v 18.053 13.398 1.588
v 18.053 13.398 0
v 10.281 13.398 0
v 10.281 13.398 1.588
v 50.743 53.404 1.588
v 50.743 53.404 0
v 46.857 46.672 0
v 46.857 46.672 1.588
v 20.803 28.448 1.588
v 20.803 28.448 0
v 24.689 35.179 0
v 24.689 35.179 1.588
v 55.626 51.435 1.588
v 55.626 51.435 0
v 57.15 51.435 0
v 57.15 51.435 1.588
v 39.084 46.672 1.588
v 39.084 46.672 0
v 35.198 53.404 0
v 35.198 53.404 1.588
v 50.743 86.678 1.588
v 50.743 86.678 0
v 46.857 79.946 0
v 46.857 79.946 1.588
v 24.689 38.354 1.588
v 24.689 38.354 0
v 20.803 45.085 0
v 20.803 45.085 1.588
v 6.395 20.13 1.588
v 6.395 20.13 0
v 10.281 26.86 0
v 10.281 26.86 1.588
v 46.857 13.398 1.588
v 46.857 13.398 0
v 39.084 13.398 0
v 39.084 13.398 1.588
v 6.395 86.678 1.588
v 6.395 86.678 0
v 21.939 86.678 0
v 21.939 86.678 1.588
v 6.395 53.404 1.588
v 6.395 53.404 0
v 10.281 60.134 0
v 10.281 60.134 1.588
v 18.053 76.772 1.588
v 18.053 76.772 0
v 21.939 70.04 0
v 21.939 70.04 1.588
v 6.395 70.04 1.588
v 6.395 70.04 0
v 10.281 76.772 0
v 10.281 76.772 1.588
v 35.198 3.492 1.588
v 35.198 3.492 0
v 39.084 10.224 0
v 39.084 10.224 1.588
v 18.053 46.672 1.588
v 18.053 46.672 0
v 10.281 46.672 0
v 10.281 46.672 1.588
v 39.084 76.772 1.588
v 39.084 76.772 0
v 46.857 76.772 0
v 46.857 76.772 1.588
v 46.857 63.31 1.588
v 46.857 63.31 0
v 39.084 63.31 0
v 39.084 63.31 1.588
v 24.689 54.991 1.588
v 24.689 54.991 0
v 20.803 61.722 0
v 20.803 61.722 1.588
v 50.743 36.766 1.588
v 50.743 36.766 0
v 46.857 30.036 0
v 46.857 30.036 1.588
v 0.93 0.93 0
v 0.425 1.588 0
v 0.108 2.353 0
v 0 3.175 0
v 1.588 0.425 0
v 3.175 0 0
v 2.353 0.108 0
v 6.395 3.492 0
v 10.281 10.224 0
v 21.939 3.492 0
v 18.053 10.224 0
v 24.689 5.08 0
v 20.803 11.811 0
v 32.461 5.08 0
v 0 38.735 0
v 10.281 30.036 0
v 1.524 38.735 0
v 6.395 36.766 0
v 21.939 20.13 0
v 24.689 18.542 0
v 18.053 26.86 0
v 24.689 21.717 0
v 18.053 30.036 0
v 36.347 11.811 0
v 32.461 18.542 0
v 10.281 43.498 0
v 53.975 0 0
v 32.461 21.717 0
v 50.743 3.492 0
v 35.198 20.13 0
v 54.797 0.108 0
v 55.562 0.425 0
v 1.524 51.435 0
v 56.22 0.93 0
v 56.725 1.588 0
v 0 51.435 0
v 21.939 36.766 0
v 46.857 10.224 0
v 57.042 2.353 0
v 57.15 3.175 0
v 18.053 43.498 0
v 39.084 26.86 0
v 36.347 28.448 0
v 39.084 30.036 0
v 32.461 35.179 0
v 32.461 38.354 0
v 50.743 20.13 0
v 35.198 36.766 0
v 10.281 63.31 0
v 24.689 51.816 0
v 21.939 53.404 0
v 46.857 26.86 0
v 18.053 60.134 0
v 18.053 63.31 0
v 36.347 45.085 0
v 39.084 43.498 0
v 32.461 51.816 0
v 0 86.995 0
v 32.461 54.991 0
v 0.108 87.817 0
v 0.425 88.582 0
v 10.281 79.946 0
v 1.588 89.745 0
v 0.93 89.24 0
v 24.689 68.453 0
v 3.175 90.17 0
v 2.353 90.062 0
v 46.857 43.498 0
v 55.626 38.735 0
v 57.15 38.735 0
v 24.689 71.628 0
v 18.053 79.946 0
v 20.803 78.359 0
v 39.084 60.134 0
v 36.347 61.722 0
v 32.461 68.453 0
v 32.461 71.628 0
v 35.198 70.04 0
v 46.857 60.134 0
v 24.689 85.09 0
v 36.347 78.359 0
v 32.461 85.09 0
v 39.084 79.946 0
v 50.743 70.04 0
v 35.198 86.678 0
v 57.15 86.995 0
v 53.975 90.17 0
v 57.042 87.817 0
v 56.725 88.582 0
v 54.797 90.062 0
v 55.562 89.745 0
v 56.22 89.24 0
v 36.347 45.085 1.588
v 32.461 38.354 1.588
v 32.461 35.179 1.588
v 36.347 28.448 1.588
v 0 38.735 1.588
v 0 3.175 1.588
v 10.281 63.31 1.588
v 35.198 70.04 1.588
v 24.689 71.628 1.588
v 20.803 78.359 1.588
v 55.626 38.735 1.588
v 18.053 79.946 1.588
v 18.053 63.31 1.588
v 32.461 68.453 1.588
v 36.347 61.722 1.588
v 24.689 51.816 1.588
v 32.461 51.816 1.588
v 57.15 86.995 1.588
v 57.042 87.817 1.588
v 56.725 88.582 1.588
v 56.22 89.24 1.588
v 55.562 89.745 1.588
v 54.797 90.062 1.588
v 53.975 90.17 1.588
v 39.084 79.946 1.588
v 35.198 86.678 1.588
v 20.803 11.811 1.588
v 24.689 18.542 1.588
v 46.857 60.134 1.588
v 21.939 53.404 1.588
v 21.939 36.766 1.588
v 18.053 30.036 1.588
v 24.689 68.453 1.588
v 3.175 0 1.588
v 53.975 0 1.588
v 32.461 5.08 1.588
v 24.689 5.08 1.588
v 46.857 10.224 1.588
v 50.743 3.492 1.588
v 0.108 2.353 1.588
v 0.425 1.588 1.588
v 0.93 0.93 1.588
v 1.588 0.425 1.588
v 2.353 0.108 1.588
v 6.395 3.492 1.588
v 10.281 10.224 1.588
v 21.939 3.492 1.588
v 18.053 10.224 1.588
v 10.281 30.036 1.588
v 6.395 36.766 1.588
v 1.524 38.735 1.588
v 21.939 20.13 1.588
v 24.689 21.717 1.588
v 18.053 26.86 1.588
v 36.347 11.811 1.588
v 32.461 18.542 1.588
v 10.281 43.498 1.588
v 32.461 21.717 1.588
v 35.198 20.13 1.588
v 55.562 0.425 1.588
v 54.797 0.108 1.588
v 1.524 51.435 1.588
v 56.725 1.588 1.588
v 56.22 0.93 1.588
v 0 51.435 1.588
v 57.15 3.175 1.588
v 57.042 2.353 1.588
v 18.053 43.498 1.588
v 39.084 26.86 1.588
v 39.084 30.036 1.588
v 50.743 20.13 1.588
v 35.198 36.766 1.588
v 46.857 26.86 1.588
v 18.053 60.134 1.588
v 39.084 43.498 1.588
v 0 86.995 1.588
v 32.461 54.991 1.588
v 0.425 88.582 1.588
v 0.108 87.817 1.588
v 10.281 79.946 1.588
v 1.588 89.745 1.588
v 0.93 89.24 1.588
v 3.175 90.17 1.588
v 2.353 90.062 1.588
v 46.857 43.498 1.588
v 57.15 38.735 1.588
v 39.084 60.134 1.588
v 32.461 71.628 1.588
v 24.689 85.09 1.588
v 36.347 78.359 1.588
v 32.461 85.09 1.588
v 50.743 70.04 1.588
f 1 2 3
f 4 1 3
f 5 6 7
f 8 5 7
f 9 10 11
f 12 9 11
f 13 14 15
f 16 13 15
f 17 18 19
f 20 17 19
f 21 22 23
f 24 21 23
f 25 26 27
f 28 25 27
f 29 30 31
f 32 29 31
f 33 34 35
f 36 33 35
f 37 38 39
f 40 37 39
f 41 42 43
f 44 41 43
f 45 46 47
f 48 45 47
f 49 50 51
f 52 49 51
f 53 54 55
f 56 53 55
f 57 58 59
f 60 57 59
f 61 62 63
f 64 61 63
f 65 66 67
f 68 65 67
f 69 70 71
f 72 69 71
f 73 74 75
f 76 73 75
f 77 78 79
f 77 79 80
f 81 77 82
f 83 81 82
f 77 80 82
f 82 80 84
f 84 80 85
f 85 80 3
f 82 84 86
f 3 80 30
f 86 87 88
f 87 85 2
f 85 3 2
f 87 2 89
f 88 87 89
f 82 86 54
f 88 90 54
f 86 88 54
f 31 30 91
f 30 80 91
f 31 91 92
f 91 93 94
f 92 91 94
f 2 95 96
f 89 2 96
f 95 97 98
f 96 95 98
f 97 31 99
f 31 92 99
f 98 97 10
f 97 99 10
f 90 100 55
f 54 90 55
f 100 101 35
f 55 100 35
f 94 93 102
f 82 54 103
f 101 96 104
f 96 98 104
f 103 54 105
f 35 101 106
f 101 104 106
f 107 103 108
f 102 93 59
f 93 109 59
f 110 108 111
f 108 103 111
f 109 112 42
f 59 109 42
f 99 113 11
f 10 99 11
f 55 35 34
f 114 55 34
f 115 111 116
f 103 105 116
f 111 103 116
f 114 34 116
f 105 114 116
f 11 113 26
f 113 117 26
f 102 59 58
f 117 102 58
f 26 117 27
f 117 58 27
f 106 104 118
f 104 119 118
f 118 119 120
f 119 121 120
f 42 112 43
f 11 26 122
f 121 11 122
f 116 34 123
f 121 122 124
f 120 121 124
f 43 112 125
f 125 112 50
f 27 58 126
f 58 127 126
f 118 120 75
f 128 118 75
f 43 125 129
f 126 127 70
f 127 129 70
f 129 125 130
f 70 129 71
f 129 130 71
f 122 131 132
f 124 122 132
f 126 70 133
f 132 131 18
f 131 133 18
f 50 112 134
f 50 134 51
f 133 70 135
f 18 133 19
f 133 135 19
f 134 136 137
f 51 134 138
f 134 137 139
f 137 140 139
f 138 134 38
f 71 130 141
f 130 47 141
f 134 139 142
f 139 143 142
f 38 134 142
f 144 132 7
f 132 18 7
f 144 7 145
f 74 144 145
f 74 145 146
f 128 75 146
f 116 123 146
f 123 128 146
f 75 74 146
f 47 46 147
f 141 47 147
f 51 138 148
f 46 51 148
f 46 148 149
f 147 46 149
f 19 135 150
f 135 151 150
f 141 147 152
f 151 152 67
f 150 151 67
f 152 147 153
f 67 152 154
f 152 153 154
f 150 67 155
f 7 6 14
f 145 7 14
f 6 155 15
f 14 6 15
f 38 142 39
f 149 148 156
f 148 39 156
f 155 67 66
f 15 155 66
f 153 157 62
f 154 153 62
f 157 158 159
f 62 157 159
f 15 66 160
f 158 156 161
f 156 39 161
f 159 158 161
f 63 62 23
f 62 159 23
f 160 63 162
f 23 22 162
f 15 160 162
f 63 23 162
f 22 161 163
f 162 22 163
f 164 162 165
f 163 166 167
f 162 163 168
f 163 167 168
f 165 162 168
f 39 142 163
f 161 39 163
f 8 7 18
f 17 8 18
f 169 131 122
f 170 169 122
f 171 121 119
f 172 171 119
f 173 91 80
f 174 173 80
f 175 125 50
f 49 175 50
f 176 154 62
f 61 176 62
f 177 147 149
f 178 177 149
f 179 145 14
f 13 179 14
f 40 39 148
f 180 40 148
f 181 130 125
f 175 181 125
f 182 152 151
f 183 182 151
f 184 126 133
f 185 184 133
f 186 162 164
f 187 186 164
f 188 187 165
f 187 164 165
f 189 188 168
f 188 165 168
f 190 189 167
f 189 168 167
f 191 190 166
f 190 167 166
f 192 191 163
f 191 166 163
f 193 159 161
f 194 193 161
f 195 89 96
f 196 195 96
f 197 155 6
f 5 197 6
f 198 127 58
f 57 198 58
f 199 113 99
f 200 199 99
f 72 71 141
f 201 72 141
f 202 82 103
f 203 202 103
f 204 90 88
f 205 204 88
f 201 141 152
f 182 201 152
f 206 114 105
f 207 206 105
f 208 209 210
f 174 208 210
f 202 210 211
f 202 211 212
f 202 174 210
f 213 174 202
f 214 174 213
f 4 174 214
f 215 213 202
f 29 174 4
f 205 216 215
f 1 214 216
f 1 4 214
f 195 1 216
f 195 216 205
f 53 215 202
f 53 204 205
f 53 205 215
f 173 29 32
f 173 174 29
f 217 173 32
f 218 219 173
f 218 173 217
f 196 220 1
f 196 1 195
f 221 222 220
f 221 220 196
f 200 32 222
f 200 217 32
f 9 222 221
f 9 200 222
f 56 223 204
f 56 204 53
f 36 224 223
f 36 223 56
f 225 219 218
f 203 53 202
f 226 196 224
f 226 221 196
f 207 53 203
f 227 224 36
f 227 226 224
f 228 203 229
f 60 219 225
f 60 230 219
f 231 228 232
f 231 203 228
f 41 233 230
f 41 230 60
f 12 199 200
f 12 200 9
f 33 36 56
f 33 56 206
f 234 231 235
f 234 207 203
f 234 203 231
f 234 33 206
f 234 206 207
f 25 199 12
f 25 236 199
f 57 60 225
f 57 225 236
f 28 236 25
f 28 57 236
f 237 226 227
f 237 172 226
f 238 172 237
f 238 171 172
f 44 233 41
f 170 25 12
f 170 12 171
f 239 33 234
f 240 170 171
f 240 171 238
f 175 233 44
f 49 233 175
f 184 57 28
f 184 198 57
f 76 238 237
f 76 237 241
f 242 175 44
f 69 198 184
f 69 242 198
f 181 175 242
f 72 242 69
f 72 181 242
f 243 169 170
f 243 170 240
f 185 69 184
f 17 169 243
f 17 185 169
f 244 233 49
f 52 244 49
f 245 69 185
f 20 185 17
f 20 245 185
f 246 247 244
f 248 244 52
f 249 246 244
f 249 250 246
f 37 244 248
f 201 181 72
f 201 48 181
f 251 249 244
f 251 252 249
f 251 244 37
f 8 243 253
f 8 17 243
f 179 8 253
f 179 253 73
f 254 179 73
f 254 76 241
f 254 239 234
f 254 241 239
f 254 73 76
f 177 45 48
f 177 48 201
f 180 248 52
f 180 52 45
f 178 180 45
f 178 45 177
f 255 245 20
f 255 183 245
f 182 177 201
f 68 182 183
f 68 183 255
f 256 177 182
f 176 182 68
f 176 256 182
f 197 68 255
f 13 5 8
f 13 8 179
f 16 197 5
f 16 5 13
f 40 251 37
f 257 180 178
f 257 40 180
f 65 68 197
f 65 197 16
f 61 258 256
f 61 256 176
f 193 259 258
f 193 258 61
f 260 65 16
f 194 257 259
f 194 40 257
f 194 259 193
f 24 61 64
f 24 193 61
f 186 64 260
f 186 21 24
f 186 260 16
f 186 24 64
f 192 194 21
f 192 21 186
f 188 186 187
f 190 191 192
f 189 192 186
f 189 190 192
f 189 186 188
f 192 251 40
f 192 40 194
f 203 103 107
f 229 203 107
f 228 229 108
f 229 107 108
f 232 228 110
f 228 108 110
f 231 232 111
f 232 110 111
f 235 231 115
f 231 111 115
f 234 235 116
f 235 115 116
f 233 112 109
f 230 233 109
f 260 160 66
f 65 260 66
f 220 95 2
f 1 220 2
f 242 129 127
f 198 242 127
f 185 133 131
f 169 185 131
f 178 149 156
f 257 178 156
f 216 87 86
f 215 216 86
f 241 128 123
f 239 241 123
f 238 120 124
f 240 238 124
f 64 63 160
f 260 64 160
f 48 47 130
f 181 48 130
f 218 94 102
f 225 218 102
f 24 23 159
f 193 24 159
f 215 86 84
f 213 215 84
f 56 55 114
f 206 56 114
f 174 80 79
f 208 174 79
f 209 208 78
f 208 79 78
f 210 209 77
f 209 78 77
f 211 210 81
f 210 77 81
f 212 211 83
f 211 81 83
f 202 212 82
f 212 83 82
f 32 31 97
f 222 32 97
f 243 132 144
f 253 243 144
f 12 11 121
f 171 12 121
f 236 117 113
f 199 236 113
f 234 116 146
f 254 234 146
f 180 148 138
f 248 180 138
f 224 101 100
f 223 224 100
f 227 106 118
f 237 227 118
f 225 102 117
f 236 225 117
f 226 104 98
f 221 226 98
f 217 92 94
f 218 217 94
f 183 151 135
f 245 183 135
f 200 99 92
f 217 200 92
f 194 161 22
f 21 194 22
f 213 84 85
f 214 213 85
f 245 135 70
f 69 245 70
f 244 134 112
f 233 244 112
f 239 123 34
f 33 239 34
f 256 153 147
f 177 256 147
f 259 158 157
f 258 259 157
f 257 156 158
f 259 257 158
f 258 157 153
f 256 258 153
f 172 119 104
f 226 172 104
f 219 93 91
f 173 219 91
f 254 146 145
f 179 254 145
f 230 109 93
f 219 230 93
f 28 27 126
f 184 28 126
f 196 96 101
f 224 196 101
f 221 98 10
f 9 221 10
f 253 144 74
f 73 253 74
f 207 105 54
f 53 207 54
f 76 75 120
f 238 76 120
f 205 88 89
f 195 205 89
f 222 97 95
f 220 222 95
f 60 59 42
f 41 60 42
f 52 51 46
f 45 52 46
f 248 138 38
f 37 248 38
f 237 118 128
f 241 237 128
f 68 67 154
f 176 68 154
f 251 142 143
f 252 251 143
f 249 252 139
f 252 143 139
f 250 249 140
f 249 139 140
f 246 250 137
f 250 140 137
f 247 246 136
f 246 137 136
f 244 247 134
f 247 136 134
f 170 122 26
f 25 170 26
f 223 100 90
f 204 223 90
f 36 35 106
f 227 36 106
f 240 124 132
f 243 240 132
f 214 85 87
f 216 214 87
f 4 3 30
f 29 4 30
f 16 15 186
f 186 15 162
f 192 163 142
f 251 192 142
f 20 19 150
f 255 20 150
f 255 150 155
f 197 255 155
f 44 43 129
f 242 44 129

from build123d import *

# Parameters (mm, degrees)
F1_DEPTH = 1.5875


with BuildPart() as f1:
    # F0 (on Top) → F1 (new body)
    with BuildSketch(Plane.XY):
        with BuildLine():
            ThreePointArc((0, 3.175), (0.929936, 0.929936), (3.175, 0))
            Line((3.175, 0), (53.975, 0))
            ThreePointArc((53.975, 0), (56.220064, 0.929936), (57.15, 3.175))
            Line((57.15, 3.175), (57.15, 38.735))
            Line((57.15, 38.735), (55.626, 38.735))
            Line((55.626, 38.735), (55.626, 51.435))
            Line((55.626, 51.435), (57.15, 51.435))
            Line((57.15, 51.435), (57.15, 86.995))
            ThreePointArc((57.15, 86.995), (56.220064, 89.240064), (53.975, 90.17))
            Line((53.975, 90.17), (3.175, 90.17))
            ThreePointArc((3.175, 90.17), (0.929936, 89.240064), (0, 86.995))
            Line((0, 86.995), (0, 51.435))
            Line((0, 51.435), (1.524, 51.435))
            Line((1.524, 51.435), (1.524, 38.735))
            Line((1.524, 38.735), (0, 38.735))
            Line((0, 38.735), (0, 3.175))
        make_face()
        Polygon((10.280791, 10.2235), (18.05308, 10.2235), (21.939225, 3.4925), (6.394646, 3.4925), align=None, mode=Mode.SUBTRACT)
        Polygon((10.280791, 26.8605), (18.05308, 26.8605), (21.939225, 20.1295), (18.05308, 13.3985), (10.280791, 13.3985), (6.394646, 20.1295), align=None, mode=Mode.SUBTRACT)
        Polygon((10.280791, 43.4975), (18.05308, 43.4975), (21.939225, 36.7665), (18.05308, 30.0355), (10.280791, 30.0355), (6.394646, 36.7665), align=None, mode=Mode.SUBTRACT)
        Polygon((36.347289, 11.811), (32.461145, 5.08), (24.688855, 5.08), (20.802711, 11.811), (24.688855, 18.542), (32.461145, 18.542), align=None, mode=Mode.SUBTRACT)
        Polygon((39.084391, 10.2235), (46.85668, 10.2235), (50.742825, 3.4925), (35.198246, 3.4925), align=None, mode=Mode.SUBTRACT)
        Polygon((39.084391, 26.8605), (46.85668, 26.8605), (50.742825, 20.1295), (46.85668, 13.3985), (39.084391, 13.3985), (35.198246, 20.1295), align=None, mode=Mode.SUBTRACT)
        Polygon((36.347289, 28.448), (32.461145, 21.717), (24.688855, 21.717), (20.802711, 28.448), (24.688855, 35.179), (32.461145, 35.179), align=None, mode=Mode.SUBTRACT)
        Polygon((39.084391, 43.4975), (46.85668, 43.4975), (50.742825, 36.7665), (46.85668, 30.0355), (39.084391, 30.0355), (35.198246, 36.7665), align=None, mode=Mode.SUBTRACT)
        Polygon((10.280791, 60.1345), (18.05308, 60.1345), (21.939225, 53.4035), (18.05308, 46.6725), (10.280791, 46.6725), (6.394646, 53.4035), align=None, mode=Mode.SUBTRACT)
        Polygon((6.394646, 70.0405), (10.280791, 76.7715), (18.05308, 76.7715), (21.939225, 70.0405), (18.05308, 63.3095), (10.280791, 63.3095), align=None, mode=Mode.SUBTRACT)
        Polygon((10.280791, 79.9465), (6.394646, 86.6775), (21.939225, 86.6775), (18.05308, 79.9465), align=None, mode=Mode.SUBTRACT)
        Polygon((20.802711, 45.085), (24.688855, 51.816), (32.461145, 51.816), (36.347289, 45.085), (32.461145, 38.354), (24.688855, 38.354), align=None, mode=Mode.SUBTRACT)
        Polygon((24.688855, 54.991), (20.802711, 61.722), (24.688855, 68.453), (32.461145, 68.453), (36.347289, 61.722), (32.461145, 54.991), align=None, mode=Mode.SUBTRACT)
        Polygon((39.084391, 60.1345), (46.85668, 60.1345), (50.742825, 53.4035), (46.85668, 46.6725), (39.084391, 46.6725), (35.198246, 53.4035), align=None, mode=Mode.SUBTRACT)
        Polygon((24.688855, 71.628), (20.802711, 78.359), (24.688855, 85.09), (32.461145, 85.09), (36.347289, 78.359), (32.461145, 71.628), align=None, mode=Mode.SUBTRACT)
        Polygon((39.084391, 76.7715), (46.85668, 76.7715), (50.742825, 70.0405), (46.85668, 63.3095), (39.084391, 63.3095), (35.198246, 70.0405), align=None, mode=Mode.SUBTRACT)
        Polygon((39.084391, 79.9465), (35.198246, 86.6775), (50.742825, 86.6775), (46.85668, 79.9465), align=None, mode=Mode.SUBTRACT)
    extrude(amount=F1_DEPTH)


solid = f1.part
